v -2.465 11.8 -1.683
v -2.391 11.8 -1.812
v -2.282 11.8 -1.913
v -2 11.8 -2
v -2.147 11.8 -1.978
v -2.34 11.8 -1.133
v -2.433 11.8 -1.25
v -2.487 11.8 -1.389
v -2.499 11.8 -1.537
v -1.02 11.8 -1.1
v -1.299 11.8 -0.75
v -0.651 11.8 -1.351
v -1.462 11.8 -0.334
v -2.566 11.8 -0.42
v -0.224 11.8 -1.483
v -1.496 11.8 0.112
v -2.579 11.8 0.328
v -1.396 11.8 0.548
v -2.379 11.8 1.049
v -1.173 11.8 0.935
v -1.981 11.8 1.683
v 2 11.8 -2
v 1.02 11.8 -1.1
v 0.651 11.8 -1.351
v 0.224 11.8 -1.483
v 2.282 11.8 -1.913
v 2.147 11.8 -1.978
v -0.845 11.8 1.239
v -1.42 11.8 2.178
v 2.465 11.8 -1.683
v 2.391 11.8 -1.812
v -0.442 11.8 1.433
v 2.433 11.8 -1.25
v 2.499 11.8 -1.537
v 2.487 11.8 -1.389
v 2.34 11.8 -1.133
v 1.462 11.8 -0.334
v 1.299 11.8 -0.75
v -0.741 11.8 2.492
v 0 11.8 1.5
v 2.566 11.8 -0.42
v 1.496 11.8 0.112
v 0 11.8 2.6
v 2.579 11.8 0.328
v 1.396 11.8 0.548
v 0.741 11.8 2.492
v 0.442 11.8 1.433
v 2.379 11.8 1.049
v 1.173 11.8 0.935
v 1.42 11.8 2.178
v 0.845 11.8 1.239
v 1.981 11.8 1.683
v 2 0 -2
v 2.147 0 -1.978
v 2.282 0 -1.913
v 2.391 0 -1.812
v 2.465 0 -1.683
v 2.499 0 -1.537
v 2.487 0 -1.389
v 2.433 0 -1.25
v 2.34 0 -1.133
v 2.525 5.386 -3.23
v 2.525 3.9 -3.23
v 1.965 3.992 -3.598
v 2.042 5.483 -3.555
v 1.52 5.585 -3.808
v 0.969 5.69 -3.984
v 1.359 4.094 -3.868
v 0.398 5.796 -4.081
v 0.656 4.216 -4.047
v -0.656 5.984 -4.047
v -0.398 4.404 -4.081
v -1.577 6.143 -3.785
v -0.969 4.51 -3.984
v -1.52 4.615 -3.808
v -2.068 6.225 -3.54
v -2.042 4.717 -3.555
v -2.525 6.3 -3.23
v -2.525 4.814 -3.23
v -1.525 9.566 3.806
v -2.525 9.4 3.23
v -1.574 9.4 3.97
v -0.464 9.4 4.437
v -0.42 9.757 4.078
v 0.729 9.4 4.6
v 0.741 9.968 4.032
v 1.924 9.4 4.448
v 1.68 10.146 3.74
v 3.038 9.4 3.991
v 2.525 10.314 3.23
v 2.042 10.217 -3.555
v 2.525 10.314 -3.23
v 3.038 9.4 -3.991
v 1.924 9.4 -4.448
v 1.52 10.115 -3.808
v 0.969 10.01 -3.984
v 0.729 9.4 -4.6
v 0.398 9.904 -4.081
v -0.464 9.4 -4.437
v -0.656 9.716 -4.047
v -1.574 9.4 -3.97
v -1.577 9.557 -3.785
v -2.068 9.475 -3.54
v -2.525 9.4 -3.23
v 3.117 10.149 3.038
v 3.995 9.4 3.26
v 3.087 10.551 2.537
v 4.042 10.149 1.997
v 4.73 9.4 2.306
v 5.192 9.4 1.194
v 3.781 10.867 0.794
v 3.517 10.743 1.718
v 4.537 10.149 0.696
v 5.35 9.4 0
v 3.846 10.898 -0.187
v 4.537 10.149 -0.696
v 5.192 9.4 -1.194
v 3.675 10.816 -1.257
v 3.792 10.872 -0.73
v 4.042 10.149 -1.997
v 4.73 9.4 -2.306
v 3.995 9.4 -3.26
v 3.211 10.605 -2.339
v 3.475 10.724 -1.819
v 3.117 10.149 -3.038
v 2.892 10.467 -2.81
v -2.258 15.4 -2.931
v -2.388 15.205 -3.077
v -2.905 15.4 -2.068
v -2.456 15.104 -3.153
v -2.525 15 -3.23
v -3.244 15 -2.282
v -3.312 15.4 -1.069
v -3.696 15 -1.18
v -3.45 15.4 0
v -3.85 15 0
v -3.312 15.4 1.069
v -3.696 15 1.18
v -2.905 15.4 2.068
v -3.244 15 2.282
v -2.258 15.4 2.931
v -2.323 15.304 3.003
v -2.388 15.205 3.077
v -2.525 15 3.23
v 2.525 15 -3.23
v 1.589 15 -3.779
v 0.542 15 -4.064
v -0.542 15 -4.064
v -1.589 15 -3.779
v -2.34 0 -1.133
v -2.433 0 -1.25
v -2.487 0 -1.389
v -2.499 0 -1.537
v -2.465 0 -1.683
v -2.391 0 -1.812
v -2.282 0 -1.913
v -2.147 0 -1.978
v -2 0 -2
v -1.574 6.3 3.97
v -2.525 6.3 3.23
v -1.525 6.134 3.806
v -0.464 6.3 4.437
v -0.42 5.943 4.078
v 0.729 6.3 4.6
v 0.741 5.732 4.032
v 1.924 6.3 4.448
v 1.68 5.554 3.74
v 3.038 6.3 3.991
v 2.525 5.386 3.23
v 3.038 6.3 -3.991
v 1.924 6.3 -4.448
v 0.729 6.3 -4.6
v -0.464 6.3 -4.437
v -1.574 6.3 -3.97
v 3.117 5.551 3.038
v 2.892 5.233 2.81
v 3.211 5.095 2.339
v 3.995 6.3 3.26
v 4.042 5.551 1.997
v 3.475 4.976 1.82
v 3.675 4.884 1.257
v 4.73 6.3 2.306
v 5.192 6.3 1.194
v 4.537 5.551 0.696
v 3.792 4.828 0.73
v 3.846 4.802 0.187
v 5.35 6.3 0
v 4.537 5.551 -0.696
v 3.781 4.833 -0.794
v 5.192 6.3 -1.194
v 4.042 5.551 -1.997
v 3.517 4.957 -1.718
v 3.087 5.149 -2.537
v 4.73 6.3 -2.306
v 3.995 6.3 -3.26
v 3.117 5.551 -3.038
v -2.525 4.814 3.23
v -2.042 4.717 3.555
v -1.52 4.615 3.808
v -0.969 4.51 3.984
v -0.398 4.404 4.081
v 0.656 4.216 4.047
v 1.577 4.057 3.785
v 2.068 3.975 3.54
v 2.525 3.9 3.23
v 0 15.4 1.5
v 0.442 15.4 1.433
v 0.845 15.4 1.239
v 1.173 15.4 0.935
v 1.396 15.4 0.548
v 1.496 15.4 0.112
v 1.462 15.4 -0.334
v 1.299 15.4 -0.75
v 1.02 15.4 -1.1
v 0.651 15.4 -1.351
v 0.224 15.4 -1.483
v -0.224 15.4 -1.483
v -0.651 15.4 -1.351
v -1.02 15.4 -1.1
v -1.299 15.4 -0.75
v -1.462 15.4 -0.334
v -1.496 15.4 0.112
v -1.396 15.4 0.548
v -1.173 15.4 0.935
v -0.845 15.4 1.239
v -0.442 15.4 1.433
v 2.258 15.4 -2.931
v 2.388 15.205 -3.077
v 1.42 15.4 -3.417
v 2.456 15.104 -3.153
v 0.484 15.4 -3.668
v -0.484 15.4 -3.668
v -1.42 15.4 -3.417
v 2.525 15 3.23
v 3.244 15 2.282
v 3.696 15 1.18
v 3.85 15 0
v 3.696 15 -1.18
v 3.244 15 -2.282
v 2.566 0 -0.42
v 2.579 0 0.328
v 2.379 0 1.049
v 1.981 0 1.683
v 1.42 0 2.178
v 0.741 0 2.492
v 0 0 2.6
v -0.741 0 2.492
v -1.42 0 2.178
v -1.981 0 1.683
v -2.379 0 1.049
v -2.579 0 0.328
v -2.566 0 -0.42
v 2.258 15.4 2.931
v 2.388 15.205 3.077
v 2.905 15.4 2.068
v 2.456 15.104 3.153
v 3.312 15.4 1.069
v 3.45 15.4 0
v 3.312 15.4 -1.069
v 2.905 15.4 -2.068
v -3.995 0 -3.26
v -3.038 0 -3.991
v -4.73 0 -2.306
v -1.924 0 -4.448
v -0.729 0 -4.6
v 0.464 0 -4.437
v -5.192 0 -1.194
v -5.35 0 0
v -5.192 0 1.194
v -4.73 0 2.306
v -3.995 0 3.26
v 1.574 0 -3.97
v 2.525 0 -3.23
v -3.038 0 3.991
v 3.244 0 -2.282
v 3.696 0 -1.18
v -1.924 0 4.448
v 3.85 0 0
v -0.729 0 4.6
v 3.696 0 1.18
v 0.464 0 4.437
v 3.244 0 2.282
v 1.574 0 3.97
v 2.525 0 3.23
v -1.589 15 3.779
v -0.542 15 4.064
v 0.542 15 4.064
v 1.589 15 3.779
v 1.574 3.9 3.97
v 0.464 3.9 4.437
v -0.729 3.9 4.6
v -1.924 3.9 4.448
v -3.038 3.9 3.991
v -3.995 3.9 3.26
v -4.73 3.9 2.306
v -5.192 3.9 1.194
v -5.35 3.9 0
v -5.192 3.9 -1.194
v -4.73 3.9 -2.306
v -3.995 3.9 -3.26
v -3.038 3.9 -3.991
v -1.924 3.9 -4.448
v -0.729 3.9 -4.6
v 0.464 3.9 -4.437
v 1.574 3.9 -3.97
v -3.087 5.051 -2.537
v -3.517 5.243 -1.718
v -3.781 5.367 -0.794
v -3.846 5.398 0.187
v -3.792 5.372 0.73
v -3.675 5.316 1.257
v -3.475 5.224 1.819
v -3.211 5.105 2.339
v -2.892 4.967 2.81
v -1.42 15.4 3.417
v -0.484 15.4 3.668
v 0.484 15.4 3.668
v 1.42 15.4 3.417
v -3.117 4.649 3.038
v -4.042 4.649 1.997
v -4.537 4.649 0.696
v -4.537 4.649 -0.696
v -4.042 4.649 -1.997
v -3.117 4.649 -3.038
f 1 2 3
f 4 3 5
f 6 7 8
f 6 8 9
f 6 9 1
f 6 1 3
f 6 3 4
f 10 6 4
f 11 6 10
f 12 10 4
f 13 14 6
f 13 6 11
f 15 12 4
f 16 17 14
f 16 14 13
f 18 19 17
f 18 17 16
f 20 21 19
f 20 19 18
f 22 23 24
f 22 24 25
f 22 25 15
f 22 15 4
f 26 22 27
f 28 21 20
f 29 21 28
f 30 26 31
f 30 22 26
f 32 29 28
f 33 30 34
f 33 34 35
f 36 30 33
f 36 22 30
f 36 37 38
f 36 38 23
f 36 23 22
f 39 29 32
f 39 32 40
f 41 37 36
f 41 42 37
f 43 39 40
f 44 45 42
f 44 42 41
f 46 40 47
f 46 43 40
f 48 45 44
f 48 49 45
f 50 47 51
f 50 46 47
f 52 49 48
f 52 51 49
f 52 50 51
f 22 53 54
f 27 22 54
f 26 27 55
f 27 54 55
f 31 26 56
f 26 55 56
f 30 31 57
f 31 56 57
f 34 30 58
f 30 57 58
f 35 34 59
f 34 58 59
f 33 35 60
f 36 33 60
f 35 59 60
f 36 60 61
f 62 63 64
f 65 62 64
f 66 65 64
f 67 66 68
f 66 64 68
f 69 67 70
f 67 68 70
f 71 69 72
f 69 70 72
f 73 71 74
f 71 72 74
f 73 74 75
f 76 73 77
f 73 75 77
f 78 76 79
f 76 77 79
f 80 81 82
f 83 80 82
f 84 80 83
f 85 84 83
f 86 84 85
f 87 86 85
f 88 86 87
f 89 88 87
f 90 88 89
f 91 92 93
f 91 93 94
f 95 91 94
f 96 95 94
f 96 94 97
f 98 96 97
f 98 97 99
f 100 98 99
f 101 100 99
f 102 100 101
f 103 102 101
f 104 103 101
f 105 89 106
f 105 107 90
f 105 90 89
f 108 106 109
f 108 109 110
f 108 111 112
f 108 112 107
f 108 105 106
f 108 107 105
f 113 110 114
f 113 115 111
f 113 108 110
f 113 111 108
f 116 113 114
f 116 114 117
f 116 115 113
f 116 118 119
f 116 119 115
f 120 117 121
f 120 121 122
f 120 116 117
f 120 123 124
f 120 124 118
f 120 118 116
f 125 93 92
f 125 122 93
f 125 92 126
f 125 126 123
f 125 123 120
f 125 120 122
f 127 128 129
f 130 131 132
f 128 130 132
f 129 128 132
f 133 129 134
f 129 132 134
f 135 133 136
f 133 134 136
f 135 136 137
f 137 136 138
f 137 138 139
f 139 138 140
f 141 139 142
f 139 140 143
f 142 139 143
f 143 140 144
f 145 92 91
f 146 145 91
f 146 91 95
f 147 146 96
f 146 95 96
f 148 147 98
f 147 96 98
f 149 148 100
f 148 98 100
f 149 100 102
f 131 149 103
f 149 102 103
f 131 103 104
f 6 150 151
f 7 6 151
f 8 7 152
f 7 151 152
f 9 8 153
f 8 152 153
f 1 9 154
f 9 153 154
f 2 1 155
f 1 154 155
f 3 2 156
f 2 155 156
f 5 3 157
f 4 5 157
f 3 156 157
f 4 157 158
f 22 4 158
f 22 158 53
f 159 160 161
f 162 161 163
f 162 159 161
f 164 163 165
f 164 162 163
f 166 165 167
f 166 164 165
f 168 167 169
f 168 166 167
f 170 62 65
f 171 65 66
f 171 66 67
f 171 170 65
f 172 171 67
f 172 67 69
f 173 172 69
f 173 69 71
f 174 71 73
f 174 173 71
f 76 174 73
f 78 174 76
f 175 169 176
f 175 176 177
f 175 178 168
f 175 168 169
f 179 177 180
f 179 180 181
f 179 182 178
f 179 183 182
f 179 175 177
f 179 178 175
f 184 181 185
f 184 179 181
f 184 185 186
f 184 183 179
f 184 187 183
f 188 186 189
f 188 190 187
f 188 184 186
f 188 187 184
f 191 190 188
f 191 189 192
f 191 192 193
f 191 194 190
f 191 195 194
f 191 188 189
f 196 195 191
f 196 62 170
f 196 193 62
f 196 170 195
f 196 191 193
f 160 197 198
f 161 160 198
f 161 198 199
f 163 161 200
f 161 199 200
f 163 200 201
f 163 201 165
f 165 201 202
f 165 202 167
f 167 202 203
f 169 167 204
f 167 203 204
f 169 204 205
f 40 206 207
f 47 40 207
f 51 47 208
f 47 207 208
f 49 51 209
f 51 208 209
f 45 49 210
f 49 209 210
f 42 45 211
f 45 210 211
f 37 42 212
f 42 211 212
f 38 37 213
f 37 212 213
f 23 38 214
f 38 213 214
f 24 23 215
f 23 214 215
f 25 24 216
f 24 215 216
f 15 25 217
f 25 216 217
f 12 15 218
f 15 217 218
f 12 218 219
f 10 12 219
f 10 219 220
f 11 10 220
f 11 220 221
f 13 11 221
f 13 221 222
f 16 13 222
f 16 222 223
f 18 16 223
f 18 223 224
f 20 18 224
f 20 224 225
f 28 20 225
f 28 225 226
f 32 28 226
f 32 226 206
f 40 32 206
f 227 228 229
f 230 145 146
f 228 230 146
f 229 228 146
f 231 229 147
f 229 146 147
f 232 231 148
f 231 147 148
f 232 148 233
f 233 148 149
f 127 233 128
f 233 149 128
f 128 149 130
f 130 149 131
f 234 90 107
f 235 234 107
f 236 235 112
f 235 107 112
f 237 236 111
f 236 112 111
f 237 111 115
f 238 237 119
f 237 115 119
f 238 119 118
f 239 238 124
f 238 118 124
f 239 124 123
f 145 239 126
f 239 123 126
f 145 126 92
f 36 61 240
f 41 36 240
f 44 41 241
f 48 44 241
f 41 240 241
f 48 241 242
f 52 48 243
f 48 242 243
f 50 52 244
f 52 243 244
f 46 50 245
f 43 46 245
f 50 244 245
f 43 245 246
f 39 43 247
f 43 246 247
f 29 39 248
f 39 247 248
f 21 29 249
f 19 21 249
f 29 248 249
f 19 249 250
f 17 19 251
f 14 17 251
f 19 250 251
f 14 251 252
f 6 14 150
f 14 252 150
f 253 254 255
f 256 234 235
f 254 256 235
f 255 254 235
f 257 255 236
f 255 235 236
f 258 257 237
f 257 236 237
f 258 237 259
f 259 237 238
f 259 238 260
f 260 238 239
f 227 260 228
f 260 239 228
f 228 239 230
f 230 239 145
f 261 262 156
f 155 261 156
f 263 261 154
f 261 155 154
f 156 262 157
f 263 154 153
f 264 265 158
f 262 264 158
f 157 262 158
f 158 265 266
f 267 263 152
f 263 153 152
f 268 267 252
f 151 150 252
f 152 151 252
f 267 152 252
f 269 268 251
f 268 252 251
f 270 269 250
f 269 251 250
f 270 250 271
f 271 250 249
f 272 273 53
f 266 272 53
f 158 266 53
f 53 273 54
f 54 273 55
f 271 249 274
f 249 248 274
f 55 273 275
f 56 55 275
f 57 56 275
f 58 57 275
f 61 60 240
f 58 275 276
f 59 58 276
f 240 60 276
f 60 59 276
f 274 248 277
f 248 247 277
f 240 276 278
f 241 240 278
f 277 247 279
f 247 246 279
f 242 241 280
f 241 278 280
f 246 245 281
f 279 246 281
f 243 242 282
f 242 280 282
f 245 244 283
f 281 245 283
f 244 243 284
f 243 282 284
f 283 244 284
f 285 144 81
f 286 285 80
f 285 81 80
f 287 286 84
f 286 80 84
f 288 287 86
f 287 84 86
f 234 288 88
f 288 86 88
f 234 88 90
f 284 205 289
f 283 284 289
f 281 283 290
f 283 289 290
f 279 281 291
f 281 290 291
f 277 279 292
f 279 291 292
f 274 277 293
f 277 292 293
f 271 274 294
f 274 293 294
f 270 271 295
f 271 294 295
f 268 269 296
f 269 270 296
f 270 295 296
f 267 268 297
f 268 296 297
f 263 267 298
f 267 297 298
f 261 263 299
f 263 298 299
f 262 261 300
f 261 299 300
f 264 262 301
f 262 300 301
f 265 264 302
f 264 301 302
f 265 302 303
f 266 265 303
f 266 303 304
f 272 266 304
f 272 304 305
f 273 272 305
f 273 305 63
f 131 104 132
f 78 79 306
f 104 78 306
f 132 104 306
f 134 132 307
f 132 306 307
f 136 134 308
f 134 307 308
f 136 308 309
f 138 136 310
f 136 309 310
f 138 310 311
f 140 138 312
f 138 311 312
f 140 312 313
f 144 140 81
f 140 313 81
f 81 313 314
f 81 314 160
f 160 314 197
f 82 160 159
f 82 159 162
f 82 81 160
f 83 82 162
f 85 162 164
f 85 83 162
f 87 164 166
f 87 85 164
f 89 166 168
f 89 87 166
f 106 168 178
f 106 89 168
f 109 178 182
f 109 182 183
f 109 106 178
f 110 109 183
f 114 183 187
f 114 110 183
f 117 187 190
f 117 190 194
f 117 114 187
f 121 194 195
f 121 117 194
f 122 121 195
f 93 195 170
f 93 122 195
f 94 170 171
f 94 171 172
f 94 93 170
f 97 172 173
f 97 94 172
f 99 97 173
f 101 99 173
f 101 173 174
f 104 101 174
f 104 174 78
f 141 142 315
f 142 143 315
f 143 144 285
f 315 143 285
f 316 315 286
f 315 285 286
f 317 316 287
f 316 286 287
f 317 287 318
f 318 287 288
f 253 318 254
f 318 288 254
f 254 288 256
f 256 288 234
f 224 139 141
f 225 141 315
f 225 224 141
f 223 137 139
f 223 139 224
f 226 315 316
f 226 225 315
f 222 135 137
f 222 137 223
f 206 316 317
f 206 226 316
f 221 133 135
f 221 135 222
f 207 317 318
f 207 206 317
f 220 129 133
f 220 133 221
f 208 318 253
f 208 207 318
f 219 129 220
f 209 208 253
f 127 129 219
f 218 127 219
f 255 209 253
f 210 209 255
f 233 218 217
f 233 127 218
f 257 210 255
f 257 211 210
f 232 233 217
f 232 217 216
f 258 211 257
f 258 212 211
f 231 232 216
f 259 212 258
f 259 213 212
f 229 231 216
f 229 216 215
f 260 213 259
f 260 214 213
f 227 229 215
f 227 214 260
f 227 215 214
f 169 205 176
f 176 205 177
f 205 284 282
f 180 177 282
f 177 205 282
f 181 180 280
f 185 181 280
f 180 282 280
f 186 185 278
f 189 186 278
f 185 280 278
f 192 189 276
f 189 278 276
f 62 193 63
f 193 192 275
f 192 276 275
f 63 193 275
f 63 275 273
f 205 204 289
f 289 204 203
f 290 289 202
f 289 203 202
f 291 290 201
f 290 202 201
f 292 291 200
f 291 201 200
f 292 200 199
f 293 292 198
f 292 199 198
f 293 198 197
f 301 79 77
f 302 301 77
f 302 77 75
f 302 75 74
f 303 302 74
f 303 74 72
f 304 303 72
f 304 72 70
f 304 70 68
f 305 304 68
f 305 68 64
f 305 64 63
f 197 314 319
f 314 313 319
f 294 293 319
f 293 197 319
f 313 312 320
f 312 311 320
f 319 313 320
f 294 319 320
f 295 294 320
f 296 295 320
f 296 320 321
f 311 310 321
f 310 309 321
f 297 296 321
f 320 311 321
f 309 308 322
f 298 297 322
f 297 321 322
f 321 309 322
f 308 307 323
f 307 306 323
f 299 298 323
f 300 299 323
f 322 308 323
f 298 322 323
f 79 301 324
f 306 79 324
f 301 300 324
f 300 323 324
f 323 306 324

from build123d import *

# Parameters (mm, degrees)
BOSS_EXTRUDE1_DEPTH = 15.4
CUT_EXTRUDE1_DEPTH  = 11.8
CUT_EXTRUDE2_REACH  = 18.939
SKETCH5_R           = 1.5
CHAMFER1_SIZE       = 0.4


with BuildPart() as part:
    # Sketch1 → Boss-Extrude1 (new body)
    with BuildSketch(Plane(origin=(0, 0, 0), x_dir=(1, 0, 0), z_dir=(0, 1, 0))):
        with BuildLine():
            ThreePointArc((-2.525, -3.23022832), (0, -4.1), (2.525, -3.23022832))
            ThreePointArc((2.525, -3.23022832), (3.85, 0), (2.525, 3.23022832))
            ThreePointArc((2.525, 3.23022832), (0, 4.1), (-2.525, 3.23022832))
            ThreePointArc((-2.525, 3.23022832), (-3.85, 0), (-2.525, -3.23022832))
        make_face()
    extrude(amount=BOSS_EXTRUDE1_DEPTH)

    # Sketch2 → Revolve1 (revolve)
    with BuildSketch(Plane.XY, mode=Mode.PRIVATE) as revolve1_sk:
        Polygon((3.85, 0), (3.85, 3.9), (2.35, 5.4), (-0.75, 5.4), (-0.75, 0), align=None)
    revolve(revolve1_sk.sketch.rotate(Axis((-0.75, 5.4, 0), (0, -1, 0)), 270), axis=Axis((-0.75, 5.4, 0), (0, -1, 0)))

    # Sketch3 → Revolve2 (revolve)
    with BuildSketch(Plane.XY, mode=Mode.PRIVATE) as revolve2_sk:
        Polygon((0.75, 4.8), (-2.35, 4.8), (-3.85, 6.3), (-3.85, 9.4), (-2.35, 10.9), (0.75, 10.9), align=None)
    revolve(revolve2_sk.sketch.rotate(Axis((0.75, 4.8, 0), (0, 1, 0)), 315.394327097), axis=Axis((0.75, 4.8, 0), (0, 1, 0)))

    # Sketch4 → Cut-Extrude1 (cut)
    with BuildSketch(Plane.XZ):
        with BuildLine():
            Line((-2, -2), (2, -2))
            ThreePointArc((2, -2), (2.465465068, -1.682598659), (2.339973189, -1.133369081))
            ThreePointArc((2.339973189, -1.133369081), (0, 2.6), (-2.339973189, -1.133369081))
            ThreePointArc((-2.339973189, -1.133369081), (-2.465465068, -1.682598659), (-2, -2))
        make_face()
    extrude(amount=-CUT_EXTRUDE1_DEPTH, mode=Mode.SUBTRACT)

    # Sketch5 → Cut-Extrude2 (cut, up to next)
    with BuildSketch(Plane(origin=(0, 15.4, 0), x_dir=(1, 0, 0), z_dir=(0, 1, 0)), mode=Mode.PRIVATE) as cut_extrude2_sk1:
        with Locations(Location((0, 0, 0), (0, 0, 270))):
            Circle(SKETCH5_R)
    cut_extrude2_tool1 = extrude(cut_extrude2_sk1.sketch, amount=-CUT_EXTRUDE2_REACH, mode=Mode.PRIVATE) & part.part
    add(cut_extrude2_tool1.solids().sort_by_distance((0, 15.4, 0))[0], mode=Mode.SUBTRACT)

    # Chamfer1
    # the kernel refuses this chamfer: 0.4 mm, written as the material it takes off along each edge
    with BuildSketch(Plane(origin=(0, 15.4, 0), x_dir=(-0.7922190522423981, 0, 0.6102368173620439), z_dir=(-0.6102368173620439, 0, -0.7922190522423981))) as chamfer1_piece_1:
        Polygon((4.1 - CHAMFER1_SIZE, 0), (4.1, -CHAMFER1_SIZE), (4.1, 0), align=None)
    revolve(axis=Axis((0, 15.4, 0), (0, 1, 0)), revolution_arc=104.786743256, mode=Mode.SUBTRACT)
    with BuildSketch(Plane(origin=(-0.75, 15.4, 0), x_dir=(0.5384255548923128, 0, 0.8426730812354843), z_dir=(-0.8426730812354843, 0, 0.5384255548923128))) as chamfer1_piece_2:
        Polygon((4.6 - CHAMFER1_SIZE, 0), (4.6, -CHAMFER1_SIZE), (4.6, 0), align=None)
    revolve(axis=Axis((-0.75, 15.4, 0), (0, 1, 0)), revolution_arc=114.846952535, mode=Mode.SUBTRACT)
    with BuildSketch(Plane(origin=(0, 15.4, 0), x_dir=(0.7922190522423987, 0, -0.610236817362043), z_dir=(0.610236817362043, 0, 0.7922190522423987))) as chamfer1_piece_3:
        Polygon((4.1 - CHAMFER1_SIZE, 0), (4.1, -CHAMFER1_SIZE), (4.1, 0), align=None)
    revolve(axis=Axis((0, 15.4, 0), (0, 1, 0)), revolution_arc=104.786743256, mode=Mode.SUBTRACT)
    with BuildSketch(Plane(origin=(0.75, 15.4, 0), x_dir=(-0.5384255548923127, 0, -0.8426730812354845), z_dir=(0.8426730812354845, 0, -0.5384255548923127))) as chamfer1_piece_4:
        Polygon((4.6 - CHAMFER1_SIZE, 0), (4.6, -CHAMFER1_SIZE), (4.6, 0), align=None)
    revolve(axis=Axis((0.75, 15.4, 0), (0, 1, 0)), revolution_arc=114.846952535, mode=Mode.SUBTRACT)


solid = part.part
